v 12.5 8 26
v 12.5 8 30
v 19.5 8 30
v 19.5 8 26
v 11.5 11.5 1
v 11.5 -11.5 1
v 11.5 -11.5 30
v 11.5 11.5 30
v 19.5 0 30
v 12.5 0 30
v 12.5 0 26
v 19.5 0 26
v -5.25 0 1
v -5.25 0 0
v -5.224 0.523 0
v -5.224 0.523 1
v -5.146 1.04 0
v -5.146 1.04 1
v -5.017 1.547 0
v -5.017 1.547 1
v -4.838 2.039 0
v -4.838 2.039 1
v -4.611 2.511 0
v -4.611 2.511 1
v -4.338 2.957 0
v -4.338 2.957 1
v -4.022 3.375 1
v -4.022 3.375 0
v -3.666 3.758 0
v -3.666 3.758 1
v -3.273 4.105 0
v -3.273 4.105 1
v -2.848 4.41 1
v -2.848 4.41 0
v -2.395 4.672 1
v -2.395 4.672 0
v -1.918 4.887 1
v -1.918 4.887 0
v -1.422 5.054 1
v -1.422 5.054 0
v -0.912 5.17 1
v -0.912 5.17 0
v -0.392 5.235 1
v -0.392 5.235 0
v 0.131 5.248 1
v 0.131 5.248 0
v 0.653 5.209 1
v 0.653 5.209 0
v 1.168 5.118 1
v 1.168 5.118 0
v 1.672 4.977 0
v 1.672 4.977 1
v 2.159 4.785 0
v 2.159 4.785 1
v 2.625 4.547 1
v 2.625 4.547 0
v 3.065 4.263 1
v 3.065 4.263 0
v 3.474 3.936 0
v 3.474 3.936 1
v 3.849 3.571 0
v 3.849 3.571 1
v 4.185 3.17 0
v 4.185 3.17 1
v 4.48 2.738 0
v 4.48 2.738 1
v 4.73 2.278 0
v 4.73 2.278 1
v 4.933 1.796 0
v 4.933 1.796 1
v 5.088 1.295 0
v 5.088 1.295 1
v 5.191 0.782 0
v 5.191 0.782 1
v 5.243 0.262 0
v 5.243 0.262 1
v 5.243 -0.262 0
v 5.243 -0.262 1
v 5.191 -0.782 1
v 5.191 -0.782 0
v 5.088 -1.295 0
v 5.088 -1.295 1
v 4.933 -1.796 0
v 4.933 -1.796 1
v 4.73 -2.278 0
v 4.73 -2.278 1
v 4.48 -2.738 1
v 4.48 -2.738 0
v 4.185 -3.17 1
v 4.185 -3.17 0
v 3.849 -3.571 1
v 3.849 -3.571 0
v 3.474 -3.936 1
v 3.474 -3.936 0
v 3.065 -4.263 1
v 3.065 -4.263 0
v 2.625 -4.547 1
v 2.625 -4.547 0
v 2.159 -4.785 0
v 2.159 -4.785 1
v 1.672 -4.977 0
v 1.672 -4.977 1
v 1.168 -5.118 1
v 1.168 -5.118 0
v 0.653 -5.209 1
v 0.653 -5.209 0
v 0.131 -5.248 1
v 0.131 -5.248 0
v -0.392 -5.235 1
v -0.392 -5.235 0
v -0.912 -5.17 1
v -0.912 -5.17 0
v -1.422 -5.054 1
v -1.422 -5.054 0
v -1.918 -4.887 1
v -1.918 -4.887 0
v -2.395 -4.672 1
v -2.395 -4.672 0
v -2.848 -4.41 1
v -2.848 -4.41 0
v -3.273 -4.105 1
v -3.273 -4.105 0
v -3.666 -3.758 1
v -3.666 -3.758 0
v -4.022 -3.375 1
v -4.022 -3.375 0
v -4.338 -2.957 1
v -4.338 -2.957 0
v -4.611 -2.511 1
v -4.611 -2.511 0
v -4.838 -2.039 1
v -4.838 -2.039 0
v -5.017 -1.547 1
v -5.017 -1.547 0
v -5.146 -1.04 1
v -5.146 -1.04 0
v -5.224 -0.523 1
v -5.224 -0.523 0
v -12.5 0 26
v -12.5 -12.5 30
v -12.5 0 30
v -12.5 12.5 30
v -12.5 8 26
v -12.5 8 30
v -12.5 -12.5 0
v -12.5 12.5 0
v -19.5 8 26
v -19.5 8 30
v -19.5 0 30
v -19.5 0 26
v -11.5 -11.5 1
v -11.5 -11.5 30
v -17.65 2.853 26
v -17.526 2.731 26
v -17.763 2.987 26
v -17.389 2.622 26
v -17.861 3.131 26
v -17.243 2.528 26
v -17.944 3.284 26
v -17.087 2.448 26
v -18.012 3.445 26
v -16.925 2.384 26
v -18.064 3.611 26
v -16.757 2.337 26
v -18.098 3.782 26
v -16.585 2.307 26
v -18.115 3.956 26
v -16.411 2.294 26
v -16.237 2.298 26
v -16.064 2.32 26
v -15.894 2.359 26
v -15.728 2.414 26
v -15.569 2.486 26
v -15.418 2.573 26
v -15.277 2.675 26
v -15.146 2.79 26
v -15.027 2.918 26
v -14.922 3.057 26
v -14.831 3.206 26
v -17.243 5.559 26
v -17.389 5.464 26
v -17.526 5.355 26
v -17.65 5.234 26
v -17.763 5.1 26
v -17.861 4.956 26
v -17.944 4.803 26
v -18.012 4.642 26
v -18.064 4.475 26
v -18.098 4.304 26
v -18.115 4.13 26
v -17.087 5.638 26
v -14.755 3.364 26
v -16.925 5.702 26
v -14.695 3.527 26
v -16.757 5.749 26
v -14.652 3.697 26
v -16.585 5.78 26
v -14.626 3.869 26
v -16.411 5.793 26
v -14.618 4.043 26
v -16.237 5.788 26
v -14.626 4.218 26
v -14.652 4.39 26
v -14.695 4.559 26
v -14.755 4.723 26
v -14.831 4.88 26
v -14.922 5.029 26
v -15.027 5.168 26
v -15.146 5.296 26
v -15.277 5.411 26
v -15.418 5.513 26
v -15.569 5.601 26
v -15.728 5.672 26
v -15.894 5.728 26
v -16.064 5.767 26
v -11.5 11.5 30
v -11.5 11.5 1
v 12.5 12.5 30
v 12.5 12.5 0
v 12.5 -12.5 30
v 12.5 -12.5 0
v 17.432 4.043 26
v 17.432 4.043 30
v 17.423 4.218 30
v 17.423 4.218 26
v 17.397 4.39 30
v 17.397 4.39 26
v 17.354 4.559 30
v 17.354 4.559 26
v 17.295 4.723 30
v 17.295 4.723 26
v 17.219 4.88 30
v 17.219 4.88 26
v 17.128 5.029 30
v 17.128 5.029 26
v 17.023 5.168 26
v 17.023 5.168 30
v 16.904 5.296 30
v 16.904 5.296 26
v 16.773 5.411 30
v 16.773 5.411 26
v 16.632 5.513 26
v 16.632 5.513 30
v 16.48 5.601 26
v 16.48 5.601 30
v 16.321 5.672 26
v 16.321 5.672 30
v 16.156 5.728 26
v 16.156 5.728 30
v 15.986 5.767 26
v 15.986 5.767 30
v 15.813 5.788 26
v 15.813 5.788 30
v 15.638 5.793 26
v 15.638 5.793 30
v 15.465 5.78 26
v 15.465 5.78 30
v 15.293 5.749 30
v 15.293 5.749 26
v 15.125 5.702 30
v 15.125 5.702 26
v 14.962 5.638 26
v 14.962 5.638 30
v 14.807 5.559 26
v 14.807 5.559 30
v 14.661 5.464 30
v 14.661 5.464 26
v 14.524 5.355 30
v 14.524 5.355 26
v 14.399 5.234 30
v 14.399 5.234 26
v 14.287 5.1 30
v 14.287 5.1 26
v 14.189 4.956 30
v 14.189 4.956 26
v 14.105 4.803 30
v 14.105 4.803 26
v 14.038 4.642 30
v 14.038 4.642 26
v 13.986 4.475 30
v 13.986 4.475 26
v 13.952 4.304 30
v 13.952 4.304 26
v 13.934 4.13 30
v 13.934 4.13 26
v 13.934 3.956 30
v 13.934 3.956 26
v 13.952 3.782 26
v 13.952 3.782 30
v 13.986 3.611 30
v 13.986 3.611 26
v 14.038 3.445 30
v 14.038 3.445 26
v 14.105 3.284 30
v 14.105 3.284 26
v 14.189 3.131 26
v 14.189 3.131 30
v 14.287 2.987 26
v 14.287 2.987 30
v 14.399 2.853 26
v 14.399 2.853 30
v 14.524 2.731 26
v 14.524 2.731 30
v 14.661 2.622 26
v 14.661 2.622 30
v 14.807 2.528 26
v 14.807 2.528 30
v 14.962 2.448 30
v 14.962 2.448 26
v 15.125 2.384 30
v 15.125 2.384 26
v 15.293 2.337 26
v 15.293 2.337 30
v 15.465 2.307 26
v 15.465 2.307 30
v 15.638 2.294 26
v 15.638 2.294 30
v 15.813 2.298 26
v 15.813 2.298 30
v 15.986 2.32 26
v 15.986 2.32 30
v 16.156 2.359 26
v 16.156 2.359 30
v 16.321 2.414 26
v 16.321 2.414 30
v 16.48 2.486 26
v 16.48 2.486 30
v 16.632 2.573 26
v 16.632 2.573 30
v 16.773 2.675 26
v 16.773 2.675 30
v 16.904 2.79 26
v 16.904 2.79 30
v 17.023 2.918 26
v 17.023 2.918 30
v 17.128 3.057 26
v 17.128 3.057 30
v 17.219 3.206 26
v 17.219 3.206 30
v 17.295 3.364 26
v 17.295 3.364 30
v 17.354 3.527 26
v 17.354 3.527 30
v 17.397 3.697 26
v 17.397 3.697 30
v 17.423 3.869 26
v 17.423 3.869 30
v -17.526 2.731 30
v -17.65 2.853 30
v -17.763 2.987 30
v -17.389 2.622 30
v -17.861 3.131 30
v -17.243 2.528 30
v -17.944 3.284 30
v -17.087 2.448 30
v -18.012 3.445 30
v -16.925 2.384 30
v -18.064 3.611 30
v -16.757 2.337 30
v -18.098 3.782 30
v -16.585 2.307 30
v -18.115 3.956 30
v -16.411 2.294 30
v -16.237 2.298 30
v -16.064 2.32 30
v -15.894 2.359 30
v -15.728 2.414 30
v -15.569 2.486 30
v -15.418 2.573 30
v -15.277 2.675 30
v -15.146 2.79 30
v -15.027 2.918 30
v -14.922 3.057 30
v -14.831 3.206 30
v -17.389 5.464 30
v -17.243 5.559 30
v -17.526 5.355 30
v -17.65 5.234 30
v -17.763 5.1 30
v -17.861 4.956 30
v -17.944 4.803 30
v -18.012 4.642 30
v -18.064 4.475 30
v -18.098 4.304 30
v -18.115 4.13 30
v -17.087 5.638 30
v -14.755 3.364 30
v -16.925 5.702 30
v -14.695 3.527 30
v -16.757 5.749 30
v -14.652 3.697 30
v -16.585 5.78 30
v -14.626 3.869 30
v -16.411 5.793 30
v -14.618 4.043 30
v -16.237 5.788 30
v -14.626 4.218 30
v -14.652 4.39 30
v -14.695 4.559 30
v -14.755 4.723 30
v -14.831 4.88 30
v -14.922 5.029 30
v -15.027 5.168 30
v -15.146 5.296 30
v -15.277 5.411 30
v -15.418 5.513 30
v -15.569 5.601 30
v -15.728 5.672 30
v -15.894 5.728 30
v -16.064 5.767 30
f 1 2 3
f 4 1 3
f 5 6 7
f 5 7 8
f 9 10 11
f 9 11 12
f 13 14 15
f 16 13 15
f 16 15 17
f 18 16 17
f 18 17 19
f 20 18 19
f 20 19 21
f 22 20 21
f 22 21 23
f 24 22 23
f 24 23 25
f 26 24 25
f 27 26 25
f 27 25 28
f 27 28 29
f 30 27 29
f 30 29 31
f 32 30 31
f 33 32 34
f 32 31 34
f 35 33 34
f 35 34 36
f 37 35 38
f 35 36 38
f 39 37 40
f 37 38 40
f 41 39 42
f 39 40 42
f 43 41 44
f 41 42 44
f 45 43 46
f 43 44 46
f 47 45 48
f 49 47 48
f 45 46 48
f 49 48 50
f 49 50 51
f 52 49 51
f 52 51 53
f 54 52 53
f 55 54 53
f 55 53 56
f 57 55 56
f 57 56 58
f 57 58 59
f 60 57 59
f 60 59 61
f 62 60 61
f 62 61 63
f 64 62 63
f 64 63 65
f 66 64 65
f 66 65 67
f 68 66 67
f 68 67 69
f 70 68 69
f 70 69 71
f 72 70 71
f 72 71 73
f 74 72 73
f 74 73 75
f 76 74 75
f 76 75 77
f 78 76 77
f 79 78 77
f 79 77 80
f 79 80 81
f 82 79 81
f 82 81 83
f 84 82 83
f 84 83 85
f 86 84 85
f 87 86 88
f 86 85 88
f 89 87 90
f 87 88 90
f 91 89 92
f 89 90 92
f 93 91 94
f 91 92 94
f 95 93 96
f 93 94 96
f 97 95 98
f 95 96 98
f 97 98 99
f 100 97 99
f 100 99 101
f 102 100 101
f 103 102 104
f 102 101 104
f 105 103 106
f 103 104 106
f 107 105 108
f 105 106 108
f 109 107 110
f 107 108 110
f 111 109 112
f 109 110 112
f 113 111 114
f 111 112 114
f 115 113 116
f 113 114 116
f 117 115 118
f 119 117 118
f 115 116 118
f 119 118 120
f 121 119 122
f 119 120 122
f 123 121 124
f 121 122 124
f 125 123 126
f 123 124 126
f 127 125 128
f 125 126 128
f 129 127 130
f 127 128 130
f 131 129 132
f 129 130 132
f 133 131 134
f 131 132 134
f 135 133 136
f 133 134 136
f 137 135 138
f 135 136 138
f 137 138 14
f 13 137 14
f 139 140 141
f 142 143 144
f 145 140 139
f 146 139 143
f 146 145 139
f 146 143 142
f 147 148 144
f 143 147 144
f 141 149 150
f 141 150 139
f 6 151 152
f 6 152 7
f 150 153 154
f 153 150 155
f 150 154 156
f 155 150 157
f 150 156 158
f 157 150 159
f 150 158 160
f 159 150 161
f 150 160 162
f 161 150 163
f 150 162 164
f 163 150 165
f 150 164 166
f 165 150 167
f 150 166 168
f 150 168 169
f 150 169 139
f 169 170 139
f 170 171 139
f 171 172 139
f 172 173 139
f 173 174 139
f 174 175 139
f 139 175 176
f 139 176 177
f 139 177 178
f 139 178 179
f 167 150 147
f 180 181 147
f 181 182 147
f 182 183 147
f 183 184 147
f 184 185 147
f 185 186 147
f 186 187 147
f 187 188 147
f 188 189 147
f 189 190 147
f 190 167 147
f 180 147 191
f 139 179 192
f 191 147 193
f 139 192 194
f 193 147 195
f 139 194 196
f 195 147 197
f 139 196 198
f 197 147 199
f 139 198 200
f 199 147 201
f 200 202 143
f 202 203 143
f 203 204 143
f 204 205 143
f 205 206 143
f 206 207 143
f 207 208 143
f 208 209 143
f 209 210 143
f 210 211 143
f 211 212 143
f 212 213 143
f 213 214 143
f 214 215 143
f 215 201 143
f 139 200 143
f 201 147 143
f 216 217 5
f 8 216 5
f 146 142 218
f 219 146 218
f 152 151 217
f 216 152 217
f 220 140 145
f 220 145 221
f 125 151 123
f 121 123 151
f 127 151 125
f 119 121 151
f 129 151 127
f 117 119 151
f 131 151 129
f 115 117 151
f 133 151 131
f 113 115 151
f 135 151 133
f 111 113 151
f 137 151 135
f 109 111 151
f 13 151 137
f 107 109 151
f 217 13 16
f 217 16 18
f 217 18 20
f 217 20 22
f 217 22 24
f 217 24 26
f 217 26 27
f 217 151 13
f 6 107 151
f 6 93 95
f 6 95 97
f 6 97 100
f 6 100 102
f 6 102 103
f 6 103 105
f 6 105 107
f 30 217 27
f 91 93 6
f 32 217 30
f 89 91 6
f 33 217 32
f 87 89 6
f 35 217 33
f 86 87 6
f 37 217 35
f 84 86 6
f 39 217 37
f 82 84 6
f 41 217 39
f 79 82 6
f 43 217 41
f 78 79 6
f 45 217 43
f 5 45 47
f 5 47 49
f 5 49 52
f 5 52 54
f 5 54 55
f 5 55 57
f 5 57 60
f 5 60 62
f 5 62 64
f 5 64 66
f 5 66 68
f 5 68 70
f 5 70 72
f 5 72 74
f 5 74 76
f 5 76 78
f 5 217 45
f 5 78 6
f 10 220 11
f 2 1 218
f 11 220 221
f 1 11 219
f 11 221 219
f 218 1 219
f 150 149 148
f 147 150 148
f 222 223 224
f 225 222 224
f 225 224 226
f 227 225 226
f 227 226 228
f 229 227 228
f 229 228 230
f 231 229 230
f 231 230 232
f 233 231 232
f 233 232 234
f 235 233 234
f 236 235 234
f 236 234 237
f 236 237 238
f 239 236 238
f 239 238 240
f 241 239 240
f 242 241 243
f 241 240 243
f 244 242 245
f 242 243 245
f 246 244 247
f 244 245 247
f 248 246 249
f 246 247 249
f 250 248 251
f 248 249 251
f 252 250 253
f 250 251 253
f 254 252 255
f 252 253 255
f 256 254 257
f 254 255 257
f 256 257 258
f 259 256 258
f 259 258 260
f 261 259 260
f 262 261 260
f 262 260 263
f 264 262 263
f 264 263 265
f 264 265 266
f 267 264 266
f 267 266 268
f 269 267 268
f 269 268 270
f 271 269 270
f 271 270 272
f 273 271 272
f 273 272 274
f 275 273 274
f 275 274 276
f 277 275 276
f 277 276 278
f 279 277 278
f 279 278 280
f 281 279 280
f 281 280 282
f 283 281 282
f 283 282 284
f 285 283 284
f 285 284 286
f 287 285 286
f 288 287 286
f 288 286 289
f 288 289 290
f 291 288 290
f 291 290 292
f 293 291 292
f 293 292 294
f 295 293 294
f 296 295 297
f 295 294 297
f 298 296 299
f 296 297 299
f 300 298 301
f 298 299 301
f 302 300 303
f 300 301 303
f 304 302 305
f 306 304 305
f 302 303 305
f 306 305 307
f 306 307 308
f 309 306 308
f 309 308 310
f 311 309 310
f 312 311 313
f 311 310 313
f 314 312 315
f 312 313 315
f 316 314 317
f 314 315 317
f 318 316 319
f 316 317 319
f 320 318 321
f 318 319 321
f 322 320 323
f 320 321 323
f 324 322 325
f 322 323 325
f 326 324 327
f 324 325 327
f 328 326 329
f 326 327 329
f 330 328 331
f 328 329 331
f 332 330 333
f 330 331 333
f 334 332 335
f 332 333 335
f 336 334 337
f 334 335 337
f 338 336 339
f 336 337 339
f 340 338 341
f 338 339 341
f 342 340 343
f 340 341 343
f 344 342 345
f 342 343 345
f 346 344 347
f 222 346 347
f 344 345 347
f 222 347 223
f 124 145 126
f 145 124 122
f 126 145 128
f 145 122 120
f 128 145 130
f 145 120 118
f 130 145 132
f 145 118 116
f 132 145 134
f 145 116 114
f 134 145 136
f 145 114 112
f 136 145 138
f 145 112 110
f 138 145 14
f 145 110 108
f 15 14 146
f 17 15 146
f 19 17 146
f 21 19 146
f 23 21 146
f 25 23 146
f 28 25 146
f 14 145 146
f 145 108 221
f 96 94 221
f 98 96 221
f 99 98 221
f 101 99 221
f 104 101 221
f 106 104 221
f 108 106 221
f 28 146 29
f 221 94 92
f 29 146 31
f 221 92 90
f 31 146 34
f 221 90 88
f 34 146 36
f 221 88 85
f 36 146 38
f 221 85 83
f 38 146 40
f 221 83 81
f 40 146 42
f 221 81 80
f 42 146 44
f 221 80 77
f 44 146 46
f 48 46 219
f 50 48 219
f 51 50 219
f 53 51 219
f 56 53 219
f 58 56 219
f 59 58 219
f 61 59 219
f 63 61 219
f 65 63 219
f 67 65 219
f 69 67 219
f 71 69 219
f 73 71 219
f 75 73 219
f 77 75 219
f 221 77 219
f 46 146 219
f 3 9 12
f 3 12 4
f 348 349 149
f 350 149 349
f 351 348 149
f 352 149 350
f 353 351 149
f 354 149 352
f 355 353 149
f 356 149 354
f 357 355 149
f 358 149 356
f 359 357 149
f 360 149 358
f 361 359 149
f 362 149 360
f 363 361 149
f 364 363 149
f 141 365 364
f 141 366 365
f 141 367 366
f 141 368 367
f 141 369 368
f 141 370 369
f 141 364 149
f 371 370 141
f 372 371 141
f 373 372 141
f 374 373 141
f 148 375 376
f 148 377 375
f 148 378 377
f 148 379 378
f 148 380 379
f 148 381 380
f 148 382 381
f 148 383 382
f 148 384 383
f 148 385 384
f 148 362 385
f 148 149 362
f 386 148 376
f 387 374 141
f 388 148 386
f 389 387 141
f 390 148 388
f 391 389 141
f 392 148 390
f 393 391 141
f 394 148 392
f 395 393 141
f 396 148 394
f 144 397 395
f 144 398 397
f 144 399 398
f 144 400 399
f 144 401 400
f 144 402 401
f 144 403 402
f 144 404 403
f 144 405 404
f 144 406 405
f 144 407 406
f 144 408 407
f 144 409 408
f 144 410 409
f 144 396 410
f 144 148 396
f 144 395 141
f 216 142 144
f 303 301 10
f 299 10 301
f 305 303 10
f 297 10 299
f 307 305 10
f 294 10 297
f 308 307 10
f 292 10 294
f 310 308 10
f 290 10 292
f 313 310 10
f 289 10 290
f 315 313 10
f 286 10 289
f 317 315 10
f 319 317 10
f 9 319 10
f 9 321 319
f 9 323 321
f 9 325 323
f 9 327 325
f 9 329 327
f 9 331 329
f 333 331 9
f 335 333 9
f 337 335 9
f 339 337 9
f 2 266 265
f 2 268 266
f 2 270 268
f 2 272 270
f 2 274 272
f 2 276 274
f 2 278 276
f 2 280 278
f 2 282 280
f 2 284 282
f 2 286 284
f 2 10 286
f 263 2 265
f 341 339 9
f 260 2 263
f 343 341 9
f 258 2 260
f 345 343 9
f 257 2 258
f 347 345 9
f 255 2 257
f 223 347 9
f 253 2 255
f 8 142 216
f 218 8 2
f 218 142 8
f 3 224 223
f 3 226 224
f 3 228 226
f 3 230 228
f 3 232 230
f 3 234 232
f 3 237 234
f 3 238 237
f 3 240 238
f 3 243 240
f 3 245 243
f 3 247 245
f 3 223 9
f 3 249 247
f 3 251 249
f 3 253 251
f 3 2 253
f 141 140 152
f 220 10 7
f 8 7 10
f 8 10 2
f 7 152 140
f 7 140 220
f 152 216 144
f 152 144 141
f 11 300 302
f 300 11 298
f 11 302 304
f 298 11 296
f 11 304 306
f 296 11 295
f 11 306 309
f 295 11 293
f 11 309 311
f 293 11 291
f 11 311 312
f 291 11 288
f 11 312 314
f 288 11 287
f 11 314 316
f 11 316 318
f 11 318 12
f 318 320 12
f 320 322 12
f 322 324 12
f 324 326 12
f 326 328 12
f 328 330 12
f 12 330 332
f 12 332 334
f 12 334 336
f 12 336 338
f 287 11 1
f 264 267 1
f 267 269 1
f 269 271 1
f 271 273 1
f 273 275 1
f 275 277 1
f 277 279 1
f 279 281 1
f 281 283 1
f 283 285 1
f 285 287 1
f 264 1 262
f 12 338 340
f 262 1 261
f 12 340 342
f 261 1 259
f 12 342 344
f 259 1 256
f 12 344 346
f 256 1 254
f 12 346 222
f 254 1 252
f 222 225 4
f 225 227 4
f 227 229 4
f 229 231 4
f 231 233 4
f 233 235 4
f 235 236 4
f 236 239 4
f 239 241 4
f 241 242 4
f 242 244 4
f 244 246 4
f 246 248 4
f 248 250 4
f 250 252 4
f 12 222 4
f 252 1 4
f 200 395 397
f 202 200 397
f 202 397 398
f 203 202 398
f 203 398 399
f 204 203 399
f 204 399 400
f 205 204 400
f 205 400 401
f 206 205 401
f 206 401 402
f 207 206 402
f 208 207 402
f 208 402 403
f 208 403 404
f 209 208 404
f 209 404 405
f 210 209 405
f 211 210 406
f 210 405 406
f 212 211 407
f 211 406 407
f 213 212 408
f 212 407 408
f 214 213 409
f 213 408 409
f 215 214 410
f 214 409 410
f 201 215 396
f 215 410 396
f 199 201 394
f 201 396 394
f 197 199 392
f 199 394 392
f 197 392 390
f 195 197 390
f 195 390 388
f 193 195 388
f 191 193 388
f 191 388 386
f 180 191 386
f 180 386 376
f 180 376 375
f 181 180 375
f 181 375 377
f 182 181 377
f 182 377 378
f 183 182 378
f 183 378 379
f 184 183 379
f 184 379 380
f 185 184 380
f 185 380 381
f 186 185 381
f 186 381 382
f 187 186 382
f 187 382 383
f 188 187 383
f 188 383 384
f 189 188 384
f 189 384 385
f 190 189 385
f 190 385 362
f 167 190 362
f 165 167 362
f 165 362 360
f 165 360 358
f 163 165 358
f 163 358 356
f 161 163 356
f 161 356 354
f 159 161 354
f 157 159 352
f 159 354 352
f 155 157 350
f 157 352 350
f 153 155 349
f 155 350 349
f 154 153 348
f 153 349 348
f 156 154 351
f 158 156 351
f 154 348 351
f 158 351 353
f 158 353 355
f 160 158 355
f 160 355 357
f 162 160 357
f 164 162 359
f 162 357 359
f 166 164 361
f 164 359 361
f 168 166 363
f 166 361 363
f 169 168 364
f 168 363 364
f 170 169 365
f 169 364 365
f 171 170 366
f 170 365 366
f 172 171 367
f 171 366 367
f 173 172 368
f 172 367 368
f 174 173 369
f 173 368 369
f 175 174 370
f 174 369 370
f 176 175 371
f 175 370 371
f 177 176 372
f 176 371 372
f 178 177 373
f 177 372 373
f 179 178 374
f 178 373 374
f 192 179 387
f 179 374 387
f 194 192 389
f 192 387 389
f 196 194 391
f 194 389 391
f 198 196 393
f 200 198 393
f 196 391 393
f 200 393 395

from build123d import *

# Parameters (mm, degrees)
SKETCH1_W           = 25
SKETCH1_H           = 25
BOSS_EXTRUDE2_DEPTH = 30
SHELL3_T            = -1
SKETCH4_R           = 5.25
CUT_EXTRUDE2_DEPTH  = 25
SKETCH5_W           = 7
SKETCH5_H           = 8
BOSS_EXTRUDE3_DEPTH = 4
SKETCH6_R           = 1.75
CUT_EXTRUDE3_DEPTH  = 10


with BuildPart() as part:
    # Sketch1 → Boss-Extrude2 (new body)
    with BuildSketch(Plane.XY):
        Rectangle(SKETCH1_W, SKETCH1_H)
    extrude(amount=BOSS_EXTRUDE2_DEPTH)

    # Shell3
    shell3_openings = [part.faces().sort_by_distance(p)[0] for p in [
        (0, 0, 30),
    ]]
    offset(amount=SHELL3_T, openings=shell3_openings, kind=Kind.INTERSECTION)

    # Sketch4 → Cut-Extrude2 (cut)
    with BuildSketch(Plane(origin=(0, 0, 0), x_dir=(-1, 0, 0), z_dir=(0, 0, -1))):
        Circle(SKETCH4_R)
    extrude(amount=-CUT_EXTRUDE2_DEPTH, mode=Mode.SUBTRACT)

    # Sketch5 → Boss-Extrude3 (add)
    with BuildSketch(Plane.XY.offset(30)):
        with Locations((16, 4)):
            Rectangle(SKETCH5_W, SKETCH5_H)
        with Locations((-16, 4)):
            Rectangle(SKETCH5_W, SKETCH5_H)
    extrude(amount=-BOSS_EXTRUDE3_DEPTH)

    # Sketch6 → Cut-Extrude3 (cut)
    with BuildSketch(Plane.XY.offset(30)):
        with Locations((15.682122387, 4.043264387)):
            Circle(SKETCH6_R)
        with Locations((-16.367627776, 4.043264387)):
            Circle(SKETCH6_R)
    extrude(amount=-CUT_EXTRUDE3_DEPTH, mode=Mode.SUBTRACT)


solid = part.part
